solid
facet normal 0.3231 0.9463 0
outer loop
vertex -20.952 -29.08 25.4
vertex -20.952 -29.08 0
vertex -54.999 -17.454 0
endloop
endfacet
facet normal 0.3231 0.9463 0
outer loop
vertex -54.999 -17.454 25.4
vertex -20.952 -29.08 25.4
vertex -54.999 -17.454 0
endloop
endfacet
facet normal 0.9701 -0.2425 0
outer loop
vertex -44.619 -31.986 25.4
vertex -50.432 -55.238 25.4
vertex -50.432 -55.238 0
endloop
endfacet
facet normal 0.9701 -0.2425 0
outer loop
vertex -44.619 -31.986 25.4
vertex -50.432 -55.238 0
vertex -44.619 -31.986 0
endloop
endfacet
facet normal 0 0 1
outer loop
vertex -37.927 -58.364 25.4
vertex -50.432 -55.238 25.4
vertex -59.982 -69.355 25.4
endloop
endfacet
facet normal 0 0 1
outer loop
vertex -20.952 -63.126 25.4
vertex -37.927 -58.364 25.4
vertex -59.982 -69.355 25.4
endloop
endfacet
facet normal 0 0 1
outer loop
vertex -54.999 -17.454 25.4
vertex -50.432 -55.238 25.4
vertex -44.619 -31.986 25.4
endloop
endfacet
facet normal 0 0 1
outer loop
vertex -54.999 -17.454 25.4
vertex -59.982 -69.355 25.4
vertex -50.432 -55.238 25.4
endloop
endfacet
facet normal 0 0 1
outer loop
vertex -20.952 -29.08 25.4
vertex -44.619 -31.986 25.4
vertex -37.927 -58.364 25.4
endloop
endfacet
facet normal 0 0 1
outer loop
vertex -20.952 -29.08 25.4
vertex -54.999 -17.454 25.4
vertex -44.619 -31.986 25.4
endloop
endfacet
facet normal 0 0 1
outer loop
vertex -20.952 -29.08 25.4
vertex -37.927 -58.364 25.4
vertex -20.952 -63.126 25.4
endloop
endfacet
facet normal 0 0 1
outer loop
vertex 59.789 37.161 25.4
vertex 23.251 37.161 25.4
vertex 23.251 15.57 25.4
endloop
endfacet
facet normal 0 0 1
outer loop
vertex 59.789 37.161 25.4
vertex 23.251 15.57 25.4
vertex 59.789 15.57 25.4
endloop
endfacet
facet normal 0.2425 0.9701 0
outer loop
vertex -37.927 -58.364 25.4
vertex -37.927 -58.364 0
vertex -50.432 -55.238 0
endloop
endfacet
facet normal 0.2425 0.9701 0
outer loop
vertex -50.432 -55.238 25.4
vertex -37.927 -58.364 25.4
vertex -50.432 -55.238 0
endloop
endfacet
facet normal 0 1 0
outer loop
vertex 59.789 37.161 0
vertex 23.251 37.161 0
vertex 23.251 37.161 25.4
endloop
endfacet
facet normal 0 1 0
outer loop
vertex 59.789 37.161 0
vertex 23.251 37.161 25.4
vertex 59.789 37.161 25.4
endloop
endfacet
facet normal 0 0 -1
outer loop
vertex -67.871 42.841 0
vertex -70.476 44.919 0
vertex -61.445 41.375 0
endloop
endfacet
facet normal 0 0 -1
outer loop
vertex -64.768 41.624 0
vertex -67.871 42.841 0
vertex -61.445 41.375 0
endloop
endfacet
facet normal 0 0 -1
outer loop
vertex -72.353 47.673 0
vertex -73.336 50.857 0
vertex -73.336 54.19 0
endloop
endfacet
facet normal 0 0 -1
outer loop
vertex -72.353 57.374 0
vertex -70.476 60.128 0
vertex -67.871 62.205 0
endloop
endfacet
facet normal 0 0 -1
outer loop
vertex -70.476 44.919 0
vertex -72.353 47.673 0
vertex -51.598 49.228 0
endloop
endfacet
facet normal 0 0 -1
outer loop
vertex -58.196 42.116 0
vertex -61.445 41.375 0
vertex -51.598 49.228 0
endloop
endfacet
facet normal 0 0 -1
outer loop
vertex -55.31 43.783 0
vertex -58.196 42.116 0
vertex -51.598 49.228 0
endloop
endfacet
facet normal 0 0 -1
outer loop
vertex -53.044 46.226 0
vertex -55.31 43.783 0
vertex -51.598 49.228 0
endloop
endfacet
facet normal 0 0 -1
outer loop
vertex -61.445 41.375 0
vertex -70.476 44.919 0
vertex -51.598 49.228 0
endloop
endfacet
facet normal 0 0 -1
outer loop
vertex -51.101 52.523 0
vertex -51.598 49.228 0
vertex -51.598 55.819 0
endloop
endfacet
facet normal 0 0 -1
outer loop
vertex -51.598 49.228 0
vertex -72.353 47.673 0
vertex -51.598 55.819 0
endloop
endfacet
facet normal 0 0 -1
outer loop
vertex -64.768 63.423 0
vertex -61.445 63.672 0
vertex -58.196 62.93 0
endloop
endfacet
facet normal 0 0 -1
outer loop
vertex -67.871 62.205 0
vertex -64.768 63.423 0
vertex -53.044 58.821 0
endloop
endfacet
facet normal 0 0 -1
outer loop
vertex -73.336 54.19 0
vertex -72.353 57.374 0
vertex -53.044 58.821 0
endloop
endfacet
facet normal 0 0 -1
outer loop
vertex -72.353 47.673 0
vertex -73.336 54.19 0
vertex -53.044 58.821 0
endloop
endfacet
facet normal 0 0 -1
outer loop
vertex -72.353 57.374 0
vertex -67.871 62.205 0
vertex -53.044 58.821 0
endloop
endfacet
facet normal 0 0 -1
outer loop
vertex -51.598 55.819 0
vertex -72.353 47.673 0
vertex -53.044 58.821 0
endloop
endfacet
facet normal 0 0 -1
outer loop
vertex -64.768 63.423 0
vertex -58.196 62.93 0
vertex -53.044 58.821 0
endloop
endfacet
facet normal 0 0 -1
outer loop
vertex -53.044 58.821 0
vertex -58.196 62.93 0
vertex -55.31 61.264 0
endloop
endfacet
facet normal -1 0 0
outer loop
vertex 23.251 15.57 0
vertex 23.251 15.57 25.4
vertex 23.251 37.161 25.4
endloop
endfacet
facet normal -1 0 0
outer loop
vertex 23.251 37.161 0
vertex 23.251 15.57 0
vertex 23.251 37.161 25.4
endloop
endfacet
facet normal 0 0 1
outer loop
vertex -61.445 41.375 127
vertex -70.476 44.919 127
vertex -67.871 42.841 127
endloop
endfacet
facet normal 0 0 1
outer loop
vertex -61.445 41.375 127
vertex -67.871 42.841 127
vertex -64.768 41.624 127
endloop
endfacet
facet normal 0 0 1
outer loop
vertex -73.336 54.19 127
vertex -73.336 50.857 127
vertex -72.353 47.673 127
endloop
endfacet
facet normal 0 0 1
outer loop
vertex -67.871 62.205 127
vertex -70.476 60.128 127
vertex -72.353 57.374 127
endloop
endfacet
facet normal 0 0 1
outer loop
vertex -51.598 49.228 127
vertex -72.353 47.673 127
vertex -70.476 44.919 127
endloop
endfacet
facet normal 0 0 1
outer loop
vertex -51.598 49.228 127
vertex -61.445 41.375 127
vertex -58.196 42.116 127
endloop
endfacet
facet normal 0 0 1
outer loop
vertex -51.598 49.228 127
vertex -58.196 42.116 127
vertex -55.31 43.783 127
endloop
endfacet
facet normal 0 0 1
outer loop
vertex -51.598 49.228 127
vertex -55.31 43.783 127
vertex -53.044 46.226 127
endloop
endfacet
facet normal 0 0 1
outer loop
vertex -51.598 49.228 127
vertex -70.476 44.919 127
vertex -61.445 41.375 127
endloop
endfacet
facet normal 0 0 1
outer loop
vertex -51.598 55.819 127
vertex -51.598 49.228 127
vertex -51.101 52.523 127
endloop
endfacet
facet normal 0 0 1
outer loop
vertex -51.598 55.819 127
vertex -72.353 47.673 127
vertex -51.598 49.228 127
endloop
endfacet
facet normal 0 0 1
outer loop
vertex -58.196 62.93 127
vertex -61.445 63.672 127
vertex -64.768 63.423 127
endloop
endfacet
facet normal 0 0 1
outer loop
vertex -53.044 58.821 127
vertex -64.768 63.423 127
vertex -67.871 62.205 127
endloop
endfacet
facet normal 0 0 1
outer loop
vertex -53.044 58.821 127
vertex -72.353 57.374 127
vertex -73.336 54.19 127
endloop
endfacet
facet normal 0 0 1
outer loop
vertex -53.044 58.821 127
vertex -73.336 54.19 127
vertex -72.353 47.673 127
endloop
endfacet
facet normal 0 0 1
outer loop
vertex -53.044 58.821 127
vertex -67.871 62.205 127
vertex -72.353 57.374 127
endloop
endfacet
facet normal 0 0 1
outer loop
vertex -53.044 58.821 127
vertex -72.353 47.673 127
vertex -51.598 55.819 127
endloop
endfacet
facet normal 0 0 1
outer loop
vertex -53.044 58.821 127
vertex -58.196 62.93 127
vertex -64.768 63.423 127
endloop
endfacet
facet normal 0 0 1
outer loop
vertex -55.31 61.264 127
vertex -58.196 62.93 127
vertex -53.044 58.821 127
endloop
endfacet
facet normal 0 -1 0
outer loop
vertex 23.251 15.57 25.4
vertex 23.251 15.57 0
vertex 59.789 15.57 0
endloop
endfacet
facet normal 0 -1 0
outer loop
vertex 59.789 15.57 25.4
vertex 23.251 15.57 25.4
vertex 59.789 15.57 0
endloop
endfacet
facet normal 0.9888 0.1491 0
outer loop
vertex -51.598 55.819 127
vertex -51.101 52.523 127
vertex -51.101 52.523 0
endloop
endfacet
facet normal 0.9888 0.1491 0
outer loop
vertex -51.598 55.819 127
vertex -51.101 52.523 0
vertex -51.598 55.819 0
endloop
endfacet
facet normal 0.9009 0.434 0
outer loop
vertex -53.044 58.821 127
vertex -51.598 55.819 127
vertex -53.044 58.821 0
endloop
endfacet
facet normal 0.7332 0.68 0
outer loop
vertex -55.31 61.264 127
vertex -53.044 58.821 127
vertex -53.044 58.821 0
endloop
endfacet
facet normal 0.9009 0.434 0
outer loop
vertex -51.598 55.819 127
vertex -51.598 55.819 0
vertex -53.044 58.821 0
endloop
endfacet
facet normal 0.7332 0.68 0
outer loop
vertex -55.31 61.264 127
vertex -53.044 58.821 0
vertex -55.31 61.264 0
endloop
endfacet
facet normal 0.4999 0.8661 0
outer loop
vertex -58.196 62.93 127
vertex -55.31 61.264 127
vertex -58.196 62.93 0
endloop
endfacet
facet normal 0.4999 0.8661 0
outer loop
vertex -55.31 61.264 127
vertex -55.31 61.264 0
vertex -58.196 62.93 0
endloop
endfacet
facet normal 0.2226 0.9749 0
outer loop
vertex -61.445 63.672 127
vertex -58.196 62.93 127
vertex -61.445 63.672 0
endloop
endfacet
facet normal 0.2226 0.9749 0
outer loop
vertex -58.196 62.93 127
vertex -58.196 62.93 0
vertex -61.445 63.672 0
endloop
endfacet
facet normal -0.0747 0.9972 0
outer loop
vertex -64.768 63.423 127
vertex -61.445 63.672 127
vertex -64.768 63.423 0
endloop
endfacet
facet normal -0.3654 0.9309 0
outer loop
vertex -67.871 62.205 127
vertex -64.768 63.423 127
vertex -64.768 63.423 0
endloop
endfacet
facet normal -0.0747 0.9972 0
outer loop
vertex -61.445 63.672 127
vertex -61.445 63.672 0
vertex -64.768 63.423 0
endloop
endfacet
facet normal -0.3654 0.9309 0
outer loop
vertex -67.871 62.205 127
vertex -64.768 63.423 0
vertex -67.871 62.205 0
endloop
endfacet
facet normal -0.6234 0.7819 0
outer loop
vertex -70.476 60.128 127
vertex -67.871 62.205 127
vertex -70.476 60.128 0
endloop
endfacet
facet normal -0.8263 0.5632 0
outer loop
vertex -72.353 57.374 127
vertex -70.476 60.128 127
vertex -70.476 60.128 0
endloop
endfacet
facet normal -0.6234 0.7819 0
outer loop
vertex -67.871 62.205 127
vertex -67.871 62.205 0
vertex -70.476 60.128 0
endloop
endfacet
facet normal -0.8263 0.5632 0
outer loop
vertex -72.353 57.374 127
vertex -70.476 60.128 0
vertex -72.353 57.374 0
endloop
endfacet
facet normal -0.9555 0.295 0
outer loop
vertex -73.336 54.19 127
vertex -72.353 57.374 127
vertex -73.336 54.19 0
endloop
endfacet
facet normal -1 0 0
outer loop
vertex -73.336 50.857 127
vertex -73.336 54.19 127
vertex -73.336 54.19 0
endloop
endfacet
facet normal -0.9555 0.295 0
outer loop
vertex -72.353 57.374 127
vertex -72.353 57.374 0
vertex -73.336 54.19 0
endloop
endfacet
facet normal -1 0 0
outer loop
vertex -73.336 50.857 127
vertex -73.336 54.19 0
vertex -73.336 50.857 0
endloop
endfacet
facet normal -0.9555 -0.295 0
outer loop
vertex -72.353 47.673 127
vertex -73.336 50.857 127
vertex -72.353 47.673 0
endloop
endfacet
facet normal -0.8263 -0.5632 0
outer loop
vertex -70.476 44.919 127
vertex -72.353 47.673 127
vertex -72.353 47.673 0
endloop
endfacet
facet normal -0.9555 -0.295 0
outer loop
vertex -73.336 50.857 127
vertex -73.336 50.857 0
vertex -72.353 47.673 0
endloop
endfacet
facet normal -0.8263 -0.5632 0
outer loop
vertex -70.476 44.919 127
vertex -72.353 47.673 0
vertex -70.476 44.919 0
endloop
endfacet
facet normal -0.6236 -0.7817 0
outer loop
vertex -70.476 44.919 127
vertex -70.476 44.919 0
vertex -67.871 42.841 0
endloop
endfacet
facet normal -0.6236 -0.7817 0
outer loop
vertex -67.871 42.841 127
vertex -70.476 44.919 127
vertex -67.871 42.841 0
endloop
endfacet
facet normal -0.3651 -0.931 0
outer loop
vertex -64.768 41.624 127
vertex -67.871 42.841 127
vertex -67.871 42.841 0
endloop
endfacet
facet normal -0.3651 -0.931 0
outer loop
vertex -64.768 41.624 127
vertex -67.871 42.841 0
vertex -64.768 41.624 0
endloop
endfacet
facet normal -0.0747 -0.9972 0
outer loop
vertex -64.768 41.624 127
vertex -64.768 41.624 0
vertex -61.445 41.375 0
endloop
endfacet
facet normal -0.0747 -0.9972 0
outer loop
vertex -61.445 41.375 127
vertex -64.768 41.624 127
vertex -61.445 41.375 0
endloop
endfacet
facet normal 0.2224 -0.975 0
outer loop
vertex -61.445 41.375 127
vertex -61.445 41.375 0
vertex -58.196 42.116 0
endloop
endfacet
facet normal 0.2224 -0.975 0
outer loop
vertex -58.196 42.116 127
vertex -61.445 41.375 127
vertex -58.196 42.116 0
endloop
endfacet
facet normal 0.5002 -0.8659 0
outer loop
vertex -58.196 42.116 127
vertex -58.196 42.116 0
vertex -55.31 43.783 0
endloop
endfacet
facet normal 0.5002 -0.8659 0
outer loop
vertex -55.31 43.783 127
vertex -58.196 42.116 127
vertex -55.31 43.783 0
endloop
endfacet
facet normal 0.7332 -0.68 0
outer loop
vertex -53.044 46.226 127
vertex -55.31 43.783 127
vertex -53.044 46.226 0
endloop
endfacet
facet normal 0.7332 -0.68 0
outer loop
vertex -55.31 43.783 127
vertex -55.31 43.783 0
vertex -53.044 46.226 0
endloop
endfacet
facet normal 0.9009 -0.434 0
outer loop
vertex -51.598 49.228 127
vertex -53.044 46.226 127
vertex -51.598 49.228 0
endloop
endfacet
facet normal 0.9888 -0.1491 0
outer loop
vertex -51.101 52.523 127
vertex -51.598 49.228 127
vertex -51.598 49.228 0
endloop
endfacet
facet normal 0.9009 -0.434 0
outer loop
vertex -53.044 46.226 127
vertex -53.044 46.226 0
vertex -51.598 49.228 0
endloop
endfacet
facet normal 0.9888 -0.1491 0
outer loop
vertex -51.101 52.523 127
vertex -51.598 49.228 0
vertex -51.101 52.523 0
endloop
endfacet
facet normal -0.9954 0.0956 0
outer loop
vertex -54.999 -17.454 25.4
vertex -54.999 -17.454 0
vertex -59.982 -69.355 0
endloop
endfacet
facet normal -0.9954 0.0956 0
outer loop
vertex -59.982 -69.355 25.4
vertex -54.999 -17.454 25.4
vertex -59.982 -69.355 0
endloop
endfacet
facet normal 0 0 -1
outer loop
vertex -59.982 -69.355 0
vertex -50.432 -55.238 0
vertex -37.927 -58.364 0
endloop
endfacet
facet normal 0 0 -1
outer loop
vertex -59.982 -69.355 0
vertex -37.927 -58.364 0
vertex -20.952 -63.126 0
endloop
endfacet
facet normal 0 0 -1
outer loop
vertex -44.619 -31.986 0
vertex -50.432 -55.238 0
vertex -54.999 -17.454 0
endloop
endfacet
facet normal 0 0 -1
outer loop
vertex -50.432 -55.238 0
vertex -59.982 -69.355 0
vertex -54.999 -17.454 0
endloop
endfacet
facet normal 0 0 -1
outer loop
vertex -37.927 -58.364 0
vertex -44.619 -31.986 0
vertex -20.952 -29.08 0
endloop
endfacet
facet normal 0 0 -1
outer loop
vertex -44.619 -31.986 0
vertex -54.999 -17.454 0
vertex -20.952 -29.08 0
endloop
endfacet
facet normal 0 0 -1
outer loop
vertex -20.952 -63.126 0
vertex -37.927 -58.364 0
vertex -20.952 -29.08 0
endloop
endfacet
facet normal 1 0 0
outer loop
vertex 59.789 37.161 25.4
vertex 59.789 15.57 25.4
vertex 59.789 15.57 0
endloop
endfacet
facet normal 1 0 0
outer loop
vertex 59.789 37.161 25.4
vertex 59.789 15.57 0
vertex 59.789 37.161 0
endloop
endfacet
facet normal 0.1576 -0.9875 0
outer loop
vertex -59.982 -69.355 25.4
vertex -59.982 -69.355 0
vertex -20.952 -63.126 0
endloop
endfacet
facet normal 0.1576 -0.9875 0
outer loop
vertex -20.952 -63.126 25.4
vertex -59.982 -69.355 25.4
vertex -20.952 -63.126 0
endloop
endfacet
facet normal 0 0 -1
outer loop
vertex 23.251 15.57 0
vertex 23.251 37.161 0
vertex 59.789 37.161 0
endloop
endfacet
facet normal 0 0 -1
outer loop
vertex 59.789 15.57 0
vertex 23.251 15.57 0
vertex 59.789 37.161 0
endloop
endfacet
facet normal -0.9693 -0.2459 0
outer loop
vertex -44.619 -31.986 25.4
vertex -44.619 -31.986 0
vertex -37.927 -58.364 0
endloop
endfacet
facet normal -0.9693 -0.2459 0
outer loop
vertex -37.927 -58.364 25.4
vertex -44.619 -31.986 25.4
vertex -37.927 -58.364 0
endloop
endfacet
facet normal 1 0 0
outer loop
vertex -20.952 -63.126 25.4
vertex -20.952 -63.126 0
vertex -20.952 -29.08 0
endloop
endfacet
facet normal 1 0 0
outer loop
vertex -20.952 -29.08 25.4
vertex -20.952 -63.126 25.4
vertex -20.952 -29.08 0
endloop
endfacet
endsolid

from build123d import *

# Parameters (mm, degrees)
F1_DEPTH = 25.4
F0_W     = 36.537992
F0_H     = 21.590633
F2_DEPTH = 25.4
F0_R     = 11.179722
F3_DEPTH = 127


with BuildPart() as f1:
    # F0 (on Top) → F1 (new body)
    with BuildSketch(Plane.XY):
        Polygon((-20.952431, -29.079724), (-54.999199, -17.453996), (-59.981655, -69.354557), (-20.952431, -63.12649), align=None)
        Polygon((-50.431952, -55.237599), (-44.619087, -31.986151), (-37.92697, -58.363846), align=None, mode=Mode.SUBTRACT)
    extrude(amount=F1_DEPTH)


with BuildPart() as f2:
    # F0 (on Top) → F2 (new body)
    with BuildSketch(Plane.XY):
        with Locations((41.520446, 26.365479)):
            Rectangle(F0_W, F0_H)
    extrude(amount=F2_DEPTH)


with BuildPart() as f3:
    # F0 (on Top) → F3 (new body)
    with BuildSketch(Plane.XY):
        with Locations((-62.280677, 52.52336)):
            Circle(F0_R)
    extrude(amount=F3_DEPTH)


solid = Compound([f1.part, f2.part, f3.part])
